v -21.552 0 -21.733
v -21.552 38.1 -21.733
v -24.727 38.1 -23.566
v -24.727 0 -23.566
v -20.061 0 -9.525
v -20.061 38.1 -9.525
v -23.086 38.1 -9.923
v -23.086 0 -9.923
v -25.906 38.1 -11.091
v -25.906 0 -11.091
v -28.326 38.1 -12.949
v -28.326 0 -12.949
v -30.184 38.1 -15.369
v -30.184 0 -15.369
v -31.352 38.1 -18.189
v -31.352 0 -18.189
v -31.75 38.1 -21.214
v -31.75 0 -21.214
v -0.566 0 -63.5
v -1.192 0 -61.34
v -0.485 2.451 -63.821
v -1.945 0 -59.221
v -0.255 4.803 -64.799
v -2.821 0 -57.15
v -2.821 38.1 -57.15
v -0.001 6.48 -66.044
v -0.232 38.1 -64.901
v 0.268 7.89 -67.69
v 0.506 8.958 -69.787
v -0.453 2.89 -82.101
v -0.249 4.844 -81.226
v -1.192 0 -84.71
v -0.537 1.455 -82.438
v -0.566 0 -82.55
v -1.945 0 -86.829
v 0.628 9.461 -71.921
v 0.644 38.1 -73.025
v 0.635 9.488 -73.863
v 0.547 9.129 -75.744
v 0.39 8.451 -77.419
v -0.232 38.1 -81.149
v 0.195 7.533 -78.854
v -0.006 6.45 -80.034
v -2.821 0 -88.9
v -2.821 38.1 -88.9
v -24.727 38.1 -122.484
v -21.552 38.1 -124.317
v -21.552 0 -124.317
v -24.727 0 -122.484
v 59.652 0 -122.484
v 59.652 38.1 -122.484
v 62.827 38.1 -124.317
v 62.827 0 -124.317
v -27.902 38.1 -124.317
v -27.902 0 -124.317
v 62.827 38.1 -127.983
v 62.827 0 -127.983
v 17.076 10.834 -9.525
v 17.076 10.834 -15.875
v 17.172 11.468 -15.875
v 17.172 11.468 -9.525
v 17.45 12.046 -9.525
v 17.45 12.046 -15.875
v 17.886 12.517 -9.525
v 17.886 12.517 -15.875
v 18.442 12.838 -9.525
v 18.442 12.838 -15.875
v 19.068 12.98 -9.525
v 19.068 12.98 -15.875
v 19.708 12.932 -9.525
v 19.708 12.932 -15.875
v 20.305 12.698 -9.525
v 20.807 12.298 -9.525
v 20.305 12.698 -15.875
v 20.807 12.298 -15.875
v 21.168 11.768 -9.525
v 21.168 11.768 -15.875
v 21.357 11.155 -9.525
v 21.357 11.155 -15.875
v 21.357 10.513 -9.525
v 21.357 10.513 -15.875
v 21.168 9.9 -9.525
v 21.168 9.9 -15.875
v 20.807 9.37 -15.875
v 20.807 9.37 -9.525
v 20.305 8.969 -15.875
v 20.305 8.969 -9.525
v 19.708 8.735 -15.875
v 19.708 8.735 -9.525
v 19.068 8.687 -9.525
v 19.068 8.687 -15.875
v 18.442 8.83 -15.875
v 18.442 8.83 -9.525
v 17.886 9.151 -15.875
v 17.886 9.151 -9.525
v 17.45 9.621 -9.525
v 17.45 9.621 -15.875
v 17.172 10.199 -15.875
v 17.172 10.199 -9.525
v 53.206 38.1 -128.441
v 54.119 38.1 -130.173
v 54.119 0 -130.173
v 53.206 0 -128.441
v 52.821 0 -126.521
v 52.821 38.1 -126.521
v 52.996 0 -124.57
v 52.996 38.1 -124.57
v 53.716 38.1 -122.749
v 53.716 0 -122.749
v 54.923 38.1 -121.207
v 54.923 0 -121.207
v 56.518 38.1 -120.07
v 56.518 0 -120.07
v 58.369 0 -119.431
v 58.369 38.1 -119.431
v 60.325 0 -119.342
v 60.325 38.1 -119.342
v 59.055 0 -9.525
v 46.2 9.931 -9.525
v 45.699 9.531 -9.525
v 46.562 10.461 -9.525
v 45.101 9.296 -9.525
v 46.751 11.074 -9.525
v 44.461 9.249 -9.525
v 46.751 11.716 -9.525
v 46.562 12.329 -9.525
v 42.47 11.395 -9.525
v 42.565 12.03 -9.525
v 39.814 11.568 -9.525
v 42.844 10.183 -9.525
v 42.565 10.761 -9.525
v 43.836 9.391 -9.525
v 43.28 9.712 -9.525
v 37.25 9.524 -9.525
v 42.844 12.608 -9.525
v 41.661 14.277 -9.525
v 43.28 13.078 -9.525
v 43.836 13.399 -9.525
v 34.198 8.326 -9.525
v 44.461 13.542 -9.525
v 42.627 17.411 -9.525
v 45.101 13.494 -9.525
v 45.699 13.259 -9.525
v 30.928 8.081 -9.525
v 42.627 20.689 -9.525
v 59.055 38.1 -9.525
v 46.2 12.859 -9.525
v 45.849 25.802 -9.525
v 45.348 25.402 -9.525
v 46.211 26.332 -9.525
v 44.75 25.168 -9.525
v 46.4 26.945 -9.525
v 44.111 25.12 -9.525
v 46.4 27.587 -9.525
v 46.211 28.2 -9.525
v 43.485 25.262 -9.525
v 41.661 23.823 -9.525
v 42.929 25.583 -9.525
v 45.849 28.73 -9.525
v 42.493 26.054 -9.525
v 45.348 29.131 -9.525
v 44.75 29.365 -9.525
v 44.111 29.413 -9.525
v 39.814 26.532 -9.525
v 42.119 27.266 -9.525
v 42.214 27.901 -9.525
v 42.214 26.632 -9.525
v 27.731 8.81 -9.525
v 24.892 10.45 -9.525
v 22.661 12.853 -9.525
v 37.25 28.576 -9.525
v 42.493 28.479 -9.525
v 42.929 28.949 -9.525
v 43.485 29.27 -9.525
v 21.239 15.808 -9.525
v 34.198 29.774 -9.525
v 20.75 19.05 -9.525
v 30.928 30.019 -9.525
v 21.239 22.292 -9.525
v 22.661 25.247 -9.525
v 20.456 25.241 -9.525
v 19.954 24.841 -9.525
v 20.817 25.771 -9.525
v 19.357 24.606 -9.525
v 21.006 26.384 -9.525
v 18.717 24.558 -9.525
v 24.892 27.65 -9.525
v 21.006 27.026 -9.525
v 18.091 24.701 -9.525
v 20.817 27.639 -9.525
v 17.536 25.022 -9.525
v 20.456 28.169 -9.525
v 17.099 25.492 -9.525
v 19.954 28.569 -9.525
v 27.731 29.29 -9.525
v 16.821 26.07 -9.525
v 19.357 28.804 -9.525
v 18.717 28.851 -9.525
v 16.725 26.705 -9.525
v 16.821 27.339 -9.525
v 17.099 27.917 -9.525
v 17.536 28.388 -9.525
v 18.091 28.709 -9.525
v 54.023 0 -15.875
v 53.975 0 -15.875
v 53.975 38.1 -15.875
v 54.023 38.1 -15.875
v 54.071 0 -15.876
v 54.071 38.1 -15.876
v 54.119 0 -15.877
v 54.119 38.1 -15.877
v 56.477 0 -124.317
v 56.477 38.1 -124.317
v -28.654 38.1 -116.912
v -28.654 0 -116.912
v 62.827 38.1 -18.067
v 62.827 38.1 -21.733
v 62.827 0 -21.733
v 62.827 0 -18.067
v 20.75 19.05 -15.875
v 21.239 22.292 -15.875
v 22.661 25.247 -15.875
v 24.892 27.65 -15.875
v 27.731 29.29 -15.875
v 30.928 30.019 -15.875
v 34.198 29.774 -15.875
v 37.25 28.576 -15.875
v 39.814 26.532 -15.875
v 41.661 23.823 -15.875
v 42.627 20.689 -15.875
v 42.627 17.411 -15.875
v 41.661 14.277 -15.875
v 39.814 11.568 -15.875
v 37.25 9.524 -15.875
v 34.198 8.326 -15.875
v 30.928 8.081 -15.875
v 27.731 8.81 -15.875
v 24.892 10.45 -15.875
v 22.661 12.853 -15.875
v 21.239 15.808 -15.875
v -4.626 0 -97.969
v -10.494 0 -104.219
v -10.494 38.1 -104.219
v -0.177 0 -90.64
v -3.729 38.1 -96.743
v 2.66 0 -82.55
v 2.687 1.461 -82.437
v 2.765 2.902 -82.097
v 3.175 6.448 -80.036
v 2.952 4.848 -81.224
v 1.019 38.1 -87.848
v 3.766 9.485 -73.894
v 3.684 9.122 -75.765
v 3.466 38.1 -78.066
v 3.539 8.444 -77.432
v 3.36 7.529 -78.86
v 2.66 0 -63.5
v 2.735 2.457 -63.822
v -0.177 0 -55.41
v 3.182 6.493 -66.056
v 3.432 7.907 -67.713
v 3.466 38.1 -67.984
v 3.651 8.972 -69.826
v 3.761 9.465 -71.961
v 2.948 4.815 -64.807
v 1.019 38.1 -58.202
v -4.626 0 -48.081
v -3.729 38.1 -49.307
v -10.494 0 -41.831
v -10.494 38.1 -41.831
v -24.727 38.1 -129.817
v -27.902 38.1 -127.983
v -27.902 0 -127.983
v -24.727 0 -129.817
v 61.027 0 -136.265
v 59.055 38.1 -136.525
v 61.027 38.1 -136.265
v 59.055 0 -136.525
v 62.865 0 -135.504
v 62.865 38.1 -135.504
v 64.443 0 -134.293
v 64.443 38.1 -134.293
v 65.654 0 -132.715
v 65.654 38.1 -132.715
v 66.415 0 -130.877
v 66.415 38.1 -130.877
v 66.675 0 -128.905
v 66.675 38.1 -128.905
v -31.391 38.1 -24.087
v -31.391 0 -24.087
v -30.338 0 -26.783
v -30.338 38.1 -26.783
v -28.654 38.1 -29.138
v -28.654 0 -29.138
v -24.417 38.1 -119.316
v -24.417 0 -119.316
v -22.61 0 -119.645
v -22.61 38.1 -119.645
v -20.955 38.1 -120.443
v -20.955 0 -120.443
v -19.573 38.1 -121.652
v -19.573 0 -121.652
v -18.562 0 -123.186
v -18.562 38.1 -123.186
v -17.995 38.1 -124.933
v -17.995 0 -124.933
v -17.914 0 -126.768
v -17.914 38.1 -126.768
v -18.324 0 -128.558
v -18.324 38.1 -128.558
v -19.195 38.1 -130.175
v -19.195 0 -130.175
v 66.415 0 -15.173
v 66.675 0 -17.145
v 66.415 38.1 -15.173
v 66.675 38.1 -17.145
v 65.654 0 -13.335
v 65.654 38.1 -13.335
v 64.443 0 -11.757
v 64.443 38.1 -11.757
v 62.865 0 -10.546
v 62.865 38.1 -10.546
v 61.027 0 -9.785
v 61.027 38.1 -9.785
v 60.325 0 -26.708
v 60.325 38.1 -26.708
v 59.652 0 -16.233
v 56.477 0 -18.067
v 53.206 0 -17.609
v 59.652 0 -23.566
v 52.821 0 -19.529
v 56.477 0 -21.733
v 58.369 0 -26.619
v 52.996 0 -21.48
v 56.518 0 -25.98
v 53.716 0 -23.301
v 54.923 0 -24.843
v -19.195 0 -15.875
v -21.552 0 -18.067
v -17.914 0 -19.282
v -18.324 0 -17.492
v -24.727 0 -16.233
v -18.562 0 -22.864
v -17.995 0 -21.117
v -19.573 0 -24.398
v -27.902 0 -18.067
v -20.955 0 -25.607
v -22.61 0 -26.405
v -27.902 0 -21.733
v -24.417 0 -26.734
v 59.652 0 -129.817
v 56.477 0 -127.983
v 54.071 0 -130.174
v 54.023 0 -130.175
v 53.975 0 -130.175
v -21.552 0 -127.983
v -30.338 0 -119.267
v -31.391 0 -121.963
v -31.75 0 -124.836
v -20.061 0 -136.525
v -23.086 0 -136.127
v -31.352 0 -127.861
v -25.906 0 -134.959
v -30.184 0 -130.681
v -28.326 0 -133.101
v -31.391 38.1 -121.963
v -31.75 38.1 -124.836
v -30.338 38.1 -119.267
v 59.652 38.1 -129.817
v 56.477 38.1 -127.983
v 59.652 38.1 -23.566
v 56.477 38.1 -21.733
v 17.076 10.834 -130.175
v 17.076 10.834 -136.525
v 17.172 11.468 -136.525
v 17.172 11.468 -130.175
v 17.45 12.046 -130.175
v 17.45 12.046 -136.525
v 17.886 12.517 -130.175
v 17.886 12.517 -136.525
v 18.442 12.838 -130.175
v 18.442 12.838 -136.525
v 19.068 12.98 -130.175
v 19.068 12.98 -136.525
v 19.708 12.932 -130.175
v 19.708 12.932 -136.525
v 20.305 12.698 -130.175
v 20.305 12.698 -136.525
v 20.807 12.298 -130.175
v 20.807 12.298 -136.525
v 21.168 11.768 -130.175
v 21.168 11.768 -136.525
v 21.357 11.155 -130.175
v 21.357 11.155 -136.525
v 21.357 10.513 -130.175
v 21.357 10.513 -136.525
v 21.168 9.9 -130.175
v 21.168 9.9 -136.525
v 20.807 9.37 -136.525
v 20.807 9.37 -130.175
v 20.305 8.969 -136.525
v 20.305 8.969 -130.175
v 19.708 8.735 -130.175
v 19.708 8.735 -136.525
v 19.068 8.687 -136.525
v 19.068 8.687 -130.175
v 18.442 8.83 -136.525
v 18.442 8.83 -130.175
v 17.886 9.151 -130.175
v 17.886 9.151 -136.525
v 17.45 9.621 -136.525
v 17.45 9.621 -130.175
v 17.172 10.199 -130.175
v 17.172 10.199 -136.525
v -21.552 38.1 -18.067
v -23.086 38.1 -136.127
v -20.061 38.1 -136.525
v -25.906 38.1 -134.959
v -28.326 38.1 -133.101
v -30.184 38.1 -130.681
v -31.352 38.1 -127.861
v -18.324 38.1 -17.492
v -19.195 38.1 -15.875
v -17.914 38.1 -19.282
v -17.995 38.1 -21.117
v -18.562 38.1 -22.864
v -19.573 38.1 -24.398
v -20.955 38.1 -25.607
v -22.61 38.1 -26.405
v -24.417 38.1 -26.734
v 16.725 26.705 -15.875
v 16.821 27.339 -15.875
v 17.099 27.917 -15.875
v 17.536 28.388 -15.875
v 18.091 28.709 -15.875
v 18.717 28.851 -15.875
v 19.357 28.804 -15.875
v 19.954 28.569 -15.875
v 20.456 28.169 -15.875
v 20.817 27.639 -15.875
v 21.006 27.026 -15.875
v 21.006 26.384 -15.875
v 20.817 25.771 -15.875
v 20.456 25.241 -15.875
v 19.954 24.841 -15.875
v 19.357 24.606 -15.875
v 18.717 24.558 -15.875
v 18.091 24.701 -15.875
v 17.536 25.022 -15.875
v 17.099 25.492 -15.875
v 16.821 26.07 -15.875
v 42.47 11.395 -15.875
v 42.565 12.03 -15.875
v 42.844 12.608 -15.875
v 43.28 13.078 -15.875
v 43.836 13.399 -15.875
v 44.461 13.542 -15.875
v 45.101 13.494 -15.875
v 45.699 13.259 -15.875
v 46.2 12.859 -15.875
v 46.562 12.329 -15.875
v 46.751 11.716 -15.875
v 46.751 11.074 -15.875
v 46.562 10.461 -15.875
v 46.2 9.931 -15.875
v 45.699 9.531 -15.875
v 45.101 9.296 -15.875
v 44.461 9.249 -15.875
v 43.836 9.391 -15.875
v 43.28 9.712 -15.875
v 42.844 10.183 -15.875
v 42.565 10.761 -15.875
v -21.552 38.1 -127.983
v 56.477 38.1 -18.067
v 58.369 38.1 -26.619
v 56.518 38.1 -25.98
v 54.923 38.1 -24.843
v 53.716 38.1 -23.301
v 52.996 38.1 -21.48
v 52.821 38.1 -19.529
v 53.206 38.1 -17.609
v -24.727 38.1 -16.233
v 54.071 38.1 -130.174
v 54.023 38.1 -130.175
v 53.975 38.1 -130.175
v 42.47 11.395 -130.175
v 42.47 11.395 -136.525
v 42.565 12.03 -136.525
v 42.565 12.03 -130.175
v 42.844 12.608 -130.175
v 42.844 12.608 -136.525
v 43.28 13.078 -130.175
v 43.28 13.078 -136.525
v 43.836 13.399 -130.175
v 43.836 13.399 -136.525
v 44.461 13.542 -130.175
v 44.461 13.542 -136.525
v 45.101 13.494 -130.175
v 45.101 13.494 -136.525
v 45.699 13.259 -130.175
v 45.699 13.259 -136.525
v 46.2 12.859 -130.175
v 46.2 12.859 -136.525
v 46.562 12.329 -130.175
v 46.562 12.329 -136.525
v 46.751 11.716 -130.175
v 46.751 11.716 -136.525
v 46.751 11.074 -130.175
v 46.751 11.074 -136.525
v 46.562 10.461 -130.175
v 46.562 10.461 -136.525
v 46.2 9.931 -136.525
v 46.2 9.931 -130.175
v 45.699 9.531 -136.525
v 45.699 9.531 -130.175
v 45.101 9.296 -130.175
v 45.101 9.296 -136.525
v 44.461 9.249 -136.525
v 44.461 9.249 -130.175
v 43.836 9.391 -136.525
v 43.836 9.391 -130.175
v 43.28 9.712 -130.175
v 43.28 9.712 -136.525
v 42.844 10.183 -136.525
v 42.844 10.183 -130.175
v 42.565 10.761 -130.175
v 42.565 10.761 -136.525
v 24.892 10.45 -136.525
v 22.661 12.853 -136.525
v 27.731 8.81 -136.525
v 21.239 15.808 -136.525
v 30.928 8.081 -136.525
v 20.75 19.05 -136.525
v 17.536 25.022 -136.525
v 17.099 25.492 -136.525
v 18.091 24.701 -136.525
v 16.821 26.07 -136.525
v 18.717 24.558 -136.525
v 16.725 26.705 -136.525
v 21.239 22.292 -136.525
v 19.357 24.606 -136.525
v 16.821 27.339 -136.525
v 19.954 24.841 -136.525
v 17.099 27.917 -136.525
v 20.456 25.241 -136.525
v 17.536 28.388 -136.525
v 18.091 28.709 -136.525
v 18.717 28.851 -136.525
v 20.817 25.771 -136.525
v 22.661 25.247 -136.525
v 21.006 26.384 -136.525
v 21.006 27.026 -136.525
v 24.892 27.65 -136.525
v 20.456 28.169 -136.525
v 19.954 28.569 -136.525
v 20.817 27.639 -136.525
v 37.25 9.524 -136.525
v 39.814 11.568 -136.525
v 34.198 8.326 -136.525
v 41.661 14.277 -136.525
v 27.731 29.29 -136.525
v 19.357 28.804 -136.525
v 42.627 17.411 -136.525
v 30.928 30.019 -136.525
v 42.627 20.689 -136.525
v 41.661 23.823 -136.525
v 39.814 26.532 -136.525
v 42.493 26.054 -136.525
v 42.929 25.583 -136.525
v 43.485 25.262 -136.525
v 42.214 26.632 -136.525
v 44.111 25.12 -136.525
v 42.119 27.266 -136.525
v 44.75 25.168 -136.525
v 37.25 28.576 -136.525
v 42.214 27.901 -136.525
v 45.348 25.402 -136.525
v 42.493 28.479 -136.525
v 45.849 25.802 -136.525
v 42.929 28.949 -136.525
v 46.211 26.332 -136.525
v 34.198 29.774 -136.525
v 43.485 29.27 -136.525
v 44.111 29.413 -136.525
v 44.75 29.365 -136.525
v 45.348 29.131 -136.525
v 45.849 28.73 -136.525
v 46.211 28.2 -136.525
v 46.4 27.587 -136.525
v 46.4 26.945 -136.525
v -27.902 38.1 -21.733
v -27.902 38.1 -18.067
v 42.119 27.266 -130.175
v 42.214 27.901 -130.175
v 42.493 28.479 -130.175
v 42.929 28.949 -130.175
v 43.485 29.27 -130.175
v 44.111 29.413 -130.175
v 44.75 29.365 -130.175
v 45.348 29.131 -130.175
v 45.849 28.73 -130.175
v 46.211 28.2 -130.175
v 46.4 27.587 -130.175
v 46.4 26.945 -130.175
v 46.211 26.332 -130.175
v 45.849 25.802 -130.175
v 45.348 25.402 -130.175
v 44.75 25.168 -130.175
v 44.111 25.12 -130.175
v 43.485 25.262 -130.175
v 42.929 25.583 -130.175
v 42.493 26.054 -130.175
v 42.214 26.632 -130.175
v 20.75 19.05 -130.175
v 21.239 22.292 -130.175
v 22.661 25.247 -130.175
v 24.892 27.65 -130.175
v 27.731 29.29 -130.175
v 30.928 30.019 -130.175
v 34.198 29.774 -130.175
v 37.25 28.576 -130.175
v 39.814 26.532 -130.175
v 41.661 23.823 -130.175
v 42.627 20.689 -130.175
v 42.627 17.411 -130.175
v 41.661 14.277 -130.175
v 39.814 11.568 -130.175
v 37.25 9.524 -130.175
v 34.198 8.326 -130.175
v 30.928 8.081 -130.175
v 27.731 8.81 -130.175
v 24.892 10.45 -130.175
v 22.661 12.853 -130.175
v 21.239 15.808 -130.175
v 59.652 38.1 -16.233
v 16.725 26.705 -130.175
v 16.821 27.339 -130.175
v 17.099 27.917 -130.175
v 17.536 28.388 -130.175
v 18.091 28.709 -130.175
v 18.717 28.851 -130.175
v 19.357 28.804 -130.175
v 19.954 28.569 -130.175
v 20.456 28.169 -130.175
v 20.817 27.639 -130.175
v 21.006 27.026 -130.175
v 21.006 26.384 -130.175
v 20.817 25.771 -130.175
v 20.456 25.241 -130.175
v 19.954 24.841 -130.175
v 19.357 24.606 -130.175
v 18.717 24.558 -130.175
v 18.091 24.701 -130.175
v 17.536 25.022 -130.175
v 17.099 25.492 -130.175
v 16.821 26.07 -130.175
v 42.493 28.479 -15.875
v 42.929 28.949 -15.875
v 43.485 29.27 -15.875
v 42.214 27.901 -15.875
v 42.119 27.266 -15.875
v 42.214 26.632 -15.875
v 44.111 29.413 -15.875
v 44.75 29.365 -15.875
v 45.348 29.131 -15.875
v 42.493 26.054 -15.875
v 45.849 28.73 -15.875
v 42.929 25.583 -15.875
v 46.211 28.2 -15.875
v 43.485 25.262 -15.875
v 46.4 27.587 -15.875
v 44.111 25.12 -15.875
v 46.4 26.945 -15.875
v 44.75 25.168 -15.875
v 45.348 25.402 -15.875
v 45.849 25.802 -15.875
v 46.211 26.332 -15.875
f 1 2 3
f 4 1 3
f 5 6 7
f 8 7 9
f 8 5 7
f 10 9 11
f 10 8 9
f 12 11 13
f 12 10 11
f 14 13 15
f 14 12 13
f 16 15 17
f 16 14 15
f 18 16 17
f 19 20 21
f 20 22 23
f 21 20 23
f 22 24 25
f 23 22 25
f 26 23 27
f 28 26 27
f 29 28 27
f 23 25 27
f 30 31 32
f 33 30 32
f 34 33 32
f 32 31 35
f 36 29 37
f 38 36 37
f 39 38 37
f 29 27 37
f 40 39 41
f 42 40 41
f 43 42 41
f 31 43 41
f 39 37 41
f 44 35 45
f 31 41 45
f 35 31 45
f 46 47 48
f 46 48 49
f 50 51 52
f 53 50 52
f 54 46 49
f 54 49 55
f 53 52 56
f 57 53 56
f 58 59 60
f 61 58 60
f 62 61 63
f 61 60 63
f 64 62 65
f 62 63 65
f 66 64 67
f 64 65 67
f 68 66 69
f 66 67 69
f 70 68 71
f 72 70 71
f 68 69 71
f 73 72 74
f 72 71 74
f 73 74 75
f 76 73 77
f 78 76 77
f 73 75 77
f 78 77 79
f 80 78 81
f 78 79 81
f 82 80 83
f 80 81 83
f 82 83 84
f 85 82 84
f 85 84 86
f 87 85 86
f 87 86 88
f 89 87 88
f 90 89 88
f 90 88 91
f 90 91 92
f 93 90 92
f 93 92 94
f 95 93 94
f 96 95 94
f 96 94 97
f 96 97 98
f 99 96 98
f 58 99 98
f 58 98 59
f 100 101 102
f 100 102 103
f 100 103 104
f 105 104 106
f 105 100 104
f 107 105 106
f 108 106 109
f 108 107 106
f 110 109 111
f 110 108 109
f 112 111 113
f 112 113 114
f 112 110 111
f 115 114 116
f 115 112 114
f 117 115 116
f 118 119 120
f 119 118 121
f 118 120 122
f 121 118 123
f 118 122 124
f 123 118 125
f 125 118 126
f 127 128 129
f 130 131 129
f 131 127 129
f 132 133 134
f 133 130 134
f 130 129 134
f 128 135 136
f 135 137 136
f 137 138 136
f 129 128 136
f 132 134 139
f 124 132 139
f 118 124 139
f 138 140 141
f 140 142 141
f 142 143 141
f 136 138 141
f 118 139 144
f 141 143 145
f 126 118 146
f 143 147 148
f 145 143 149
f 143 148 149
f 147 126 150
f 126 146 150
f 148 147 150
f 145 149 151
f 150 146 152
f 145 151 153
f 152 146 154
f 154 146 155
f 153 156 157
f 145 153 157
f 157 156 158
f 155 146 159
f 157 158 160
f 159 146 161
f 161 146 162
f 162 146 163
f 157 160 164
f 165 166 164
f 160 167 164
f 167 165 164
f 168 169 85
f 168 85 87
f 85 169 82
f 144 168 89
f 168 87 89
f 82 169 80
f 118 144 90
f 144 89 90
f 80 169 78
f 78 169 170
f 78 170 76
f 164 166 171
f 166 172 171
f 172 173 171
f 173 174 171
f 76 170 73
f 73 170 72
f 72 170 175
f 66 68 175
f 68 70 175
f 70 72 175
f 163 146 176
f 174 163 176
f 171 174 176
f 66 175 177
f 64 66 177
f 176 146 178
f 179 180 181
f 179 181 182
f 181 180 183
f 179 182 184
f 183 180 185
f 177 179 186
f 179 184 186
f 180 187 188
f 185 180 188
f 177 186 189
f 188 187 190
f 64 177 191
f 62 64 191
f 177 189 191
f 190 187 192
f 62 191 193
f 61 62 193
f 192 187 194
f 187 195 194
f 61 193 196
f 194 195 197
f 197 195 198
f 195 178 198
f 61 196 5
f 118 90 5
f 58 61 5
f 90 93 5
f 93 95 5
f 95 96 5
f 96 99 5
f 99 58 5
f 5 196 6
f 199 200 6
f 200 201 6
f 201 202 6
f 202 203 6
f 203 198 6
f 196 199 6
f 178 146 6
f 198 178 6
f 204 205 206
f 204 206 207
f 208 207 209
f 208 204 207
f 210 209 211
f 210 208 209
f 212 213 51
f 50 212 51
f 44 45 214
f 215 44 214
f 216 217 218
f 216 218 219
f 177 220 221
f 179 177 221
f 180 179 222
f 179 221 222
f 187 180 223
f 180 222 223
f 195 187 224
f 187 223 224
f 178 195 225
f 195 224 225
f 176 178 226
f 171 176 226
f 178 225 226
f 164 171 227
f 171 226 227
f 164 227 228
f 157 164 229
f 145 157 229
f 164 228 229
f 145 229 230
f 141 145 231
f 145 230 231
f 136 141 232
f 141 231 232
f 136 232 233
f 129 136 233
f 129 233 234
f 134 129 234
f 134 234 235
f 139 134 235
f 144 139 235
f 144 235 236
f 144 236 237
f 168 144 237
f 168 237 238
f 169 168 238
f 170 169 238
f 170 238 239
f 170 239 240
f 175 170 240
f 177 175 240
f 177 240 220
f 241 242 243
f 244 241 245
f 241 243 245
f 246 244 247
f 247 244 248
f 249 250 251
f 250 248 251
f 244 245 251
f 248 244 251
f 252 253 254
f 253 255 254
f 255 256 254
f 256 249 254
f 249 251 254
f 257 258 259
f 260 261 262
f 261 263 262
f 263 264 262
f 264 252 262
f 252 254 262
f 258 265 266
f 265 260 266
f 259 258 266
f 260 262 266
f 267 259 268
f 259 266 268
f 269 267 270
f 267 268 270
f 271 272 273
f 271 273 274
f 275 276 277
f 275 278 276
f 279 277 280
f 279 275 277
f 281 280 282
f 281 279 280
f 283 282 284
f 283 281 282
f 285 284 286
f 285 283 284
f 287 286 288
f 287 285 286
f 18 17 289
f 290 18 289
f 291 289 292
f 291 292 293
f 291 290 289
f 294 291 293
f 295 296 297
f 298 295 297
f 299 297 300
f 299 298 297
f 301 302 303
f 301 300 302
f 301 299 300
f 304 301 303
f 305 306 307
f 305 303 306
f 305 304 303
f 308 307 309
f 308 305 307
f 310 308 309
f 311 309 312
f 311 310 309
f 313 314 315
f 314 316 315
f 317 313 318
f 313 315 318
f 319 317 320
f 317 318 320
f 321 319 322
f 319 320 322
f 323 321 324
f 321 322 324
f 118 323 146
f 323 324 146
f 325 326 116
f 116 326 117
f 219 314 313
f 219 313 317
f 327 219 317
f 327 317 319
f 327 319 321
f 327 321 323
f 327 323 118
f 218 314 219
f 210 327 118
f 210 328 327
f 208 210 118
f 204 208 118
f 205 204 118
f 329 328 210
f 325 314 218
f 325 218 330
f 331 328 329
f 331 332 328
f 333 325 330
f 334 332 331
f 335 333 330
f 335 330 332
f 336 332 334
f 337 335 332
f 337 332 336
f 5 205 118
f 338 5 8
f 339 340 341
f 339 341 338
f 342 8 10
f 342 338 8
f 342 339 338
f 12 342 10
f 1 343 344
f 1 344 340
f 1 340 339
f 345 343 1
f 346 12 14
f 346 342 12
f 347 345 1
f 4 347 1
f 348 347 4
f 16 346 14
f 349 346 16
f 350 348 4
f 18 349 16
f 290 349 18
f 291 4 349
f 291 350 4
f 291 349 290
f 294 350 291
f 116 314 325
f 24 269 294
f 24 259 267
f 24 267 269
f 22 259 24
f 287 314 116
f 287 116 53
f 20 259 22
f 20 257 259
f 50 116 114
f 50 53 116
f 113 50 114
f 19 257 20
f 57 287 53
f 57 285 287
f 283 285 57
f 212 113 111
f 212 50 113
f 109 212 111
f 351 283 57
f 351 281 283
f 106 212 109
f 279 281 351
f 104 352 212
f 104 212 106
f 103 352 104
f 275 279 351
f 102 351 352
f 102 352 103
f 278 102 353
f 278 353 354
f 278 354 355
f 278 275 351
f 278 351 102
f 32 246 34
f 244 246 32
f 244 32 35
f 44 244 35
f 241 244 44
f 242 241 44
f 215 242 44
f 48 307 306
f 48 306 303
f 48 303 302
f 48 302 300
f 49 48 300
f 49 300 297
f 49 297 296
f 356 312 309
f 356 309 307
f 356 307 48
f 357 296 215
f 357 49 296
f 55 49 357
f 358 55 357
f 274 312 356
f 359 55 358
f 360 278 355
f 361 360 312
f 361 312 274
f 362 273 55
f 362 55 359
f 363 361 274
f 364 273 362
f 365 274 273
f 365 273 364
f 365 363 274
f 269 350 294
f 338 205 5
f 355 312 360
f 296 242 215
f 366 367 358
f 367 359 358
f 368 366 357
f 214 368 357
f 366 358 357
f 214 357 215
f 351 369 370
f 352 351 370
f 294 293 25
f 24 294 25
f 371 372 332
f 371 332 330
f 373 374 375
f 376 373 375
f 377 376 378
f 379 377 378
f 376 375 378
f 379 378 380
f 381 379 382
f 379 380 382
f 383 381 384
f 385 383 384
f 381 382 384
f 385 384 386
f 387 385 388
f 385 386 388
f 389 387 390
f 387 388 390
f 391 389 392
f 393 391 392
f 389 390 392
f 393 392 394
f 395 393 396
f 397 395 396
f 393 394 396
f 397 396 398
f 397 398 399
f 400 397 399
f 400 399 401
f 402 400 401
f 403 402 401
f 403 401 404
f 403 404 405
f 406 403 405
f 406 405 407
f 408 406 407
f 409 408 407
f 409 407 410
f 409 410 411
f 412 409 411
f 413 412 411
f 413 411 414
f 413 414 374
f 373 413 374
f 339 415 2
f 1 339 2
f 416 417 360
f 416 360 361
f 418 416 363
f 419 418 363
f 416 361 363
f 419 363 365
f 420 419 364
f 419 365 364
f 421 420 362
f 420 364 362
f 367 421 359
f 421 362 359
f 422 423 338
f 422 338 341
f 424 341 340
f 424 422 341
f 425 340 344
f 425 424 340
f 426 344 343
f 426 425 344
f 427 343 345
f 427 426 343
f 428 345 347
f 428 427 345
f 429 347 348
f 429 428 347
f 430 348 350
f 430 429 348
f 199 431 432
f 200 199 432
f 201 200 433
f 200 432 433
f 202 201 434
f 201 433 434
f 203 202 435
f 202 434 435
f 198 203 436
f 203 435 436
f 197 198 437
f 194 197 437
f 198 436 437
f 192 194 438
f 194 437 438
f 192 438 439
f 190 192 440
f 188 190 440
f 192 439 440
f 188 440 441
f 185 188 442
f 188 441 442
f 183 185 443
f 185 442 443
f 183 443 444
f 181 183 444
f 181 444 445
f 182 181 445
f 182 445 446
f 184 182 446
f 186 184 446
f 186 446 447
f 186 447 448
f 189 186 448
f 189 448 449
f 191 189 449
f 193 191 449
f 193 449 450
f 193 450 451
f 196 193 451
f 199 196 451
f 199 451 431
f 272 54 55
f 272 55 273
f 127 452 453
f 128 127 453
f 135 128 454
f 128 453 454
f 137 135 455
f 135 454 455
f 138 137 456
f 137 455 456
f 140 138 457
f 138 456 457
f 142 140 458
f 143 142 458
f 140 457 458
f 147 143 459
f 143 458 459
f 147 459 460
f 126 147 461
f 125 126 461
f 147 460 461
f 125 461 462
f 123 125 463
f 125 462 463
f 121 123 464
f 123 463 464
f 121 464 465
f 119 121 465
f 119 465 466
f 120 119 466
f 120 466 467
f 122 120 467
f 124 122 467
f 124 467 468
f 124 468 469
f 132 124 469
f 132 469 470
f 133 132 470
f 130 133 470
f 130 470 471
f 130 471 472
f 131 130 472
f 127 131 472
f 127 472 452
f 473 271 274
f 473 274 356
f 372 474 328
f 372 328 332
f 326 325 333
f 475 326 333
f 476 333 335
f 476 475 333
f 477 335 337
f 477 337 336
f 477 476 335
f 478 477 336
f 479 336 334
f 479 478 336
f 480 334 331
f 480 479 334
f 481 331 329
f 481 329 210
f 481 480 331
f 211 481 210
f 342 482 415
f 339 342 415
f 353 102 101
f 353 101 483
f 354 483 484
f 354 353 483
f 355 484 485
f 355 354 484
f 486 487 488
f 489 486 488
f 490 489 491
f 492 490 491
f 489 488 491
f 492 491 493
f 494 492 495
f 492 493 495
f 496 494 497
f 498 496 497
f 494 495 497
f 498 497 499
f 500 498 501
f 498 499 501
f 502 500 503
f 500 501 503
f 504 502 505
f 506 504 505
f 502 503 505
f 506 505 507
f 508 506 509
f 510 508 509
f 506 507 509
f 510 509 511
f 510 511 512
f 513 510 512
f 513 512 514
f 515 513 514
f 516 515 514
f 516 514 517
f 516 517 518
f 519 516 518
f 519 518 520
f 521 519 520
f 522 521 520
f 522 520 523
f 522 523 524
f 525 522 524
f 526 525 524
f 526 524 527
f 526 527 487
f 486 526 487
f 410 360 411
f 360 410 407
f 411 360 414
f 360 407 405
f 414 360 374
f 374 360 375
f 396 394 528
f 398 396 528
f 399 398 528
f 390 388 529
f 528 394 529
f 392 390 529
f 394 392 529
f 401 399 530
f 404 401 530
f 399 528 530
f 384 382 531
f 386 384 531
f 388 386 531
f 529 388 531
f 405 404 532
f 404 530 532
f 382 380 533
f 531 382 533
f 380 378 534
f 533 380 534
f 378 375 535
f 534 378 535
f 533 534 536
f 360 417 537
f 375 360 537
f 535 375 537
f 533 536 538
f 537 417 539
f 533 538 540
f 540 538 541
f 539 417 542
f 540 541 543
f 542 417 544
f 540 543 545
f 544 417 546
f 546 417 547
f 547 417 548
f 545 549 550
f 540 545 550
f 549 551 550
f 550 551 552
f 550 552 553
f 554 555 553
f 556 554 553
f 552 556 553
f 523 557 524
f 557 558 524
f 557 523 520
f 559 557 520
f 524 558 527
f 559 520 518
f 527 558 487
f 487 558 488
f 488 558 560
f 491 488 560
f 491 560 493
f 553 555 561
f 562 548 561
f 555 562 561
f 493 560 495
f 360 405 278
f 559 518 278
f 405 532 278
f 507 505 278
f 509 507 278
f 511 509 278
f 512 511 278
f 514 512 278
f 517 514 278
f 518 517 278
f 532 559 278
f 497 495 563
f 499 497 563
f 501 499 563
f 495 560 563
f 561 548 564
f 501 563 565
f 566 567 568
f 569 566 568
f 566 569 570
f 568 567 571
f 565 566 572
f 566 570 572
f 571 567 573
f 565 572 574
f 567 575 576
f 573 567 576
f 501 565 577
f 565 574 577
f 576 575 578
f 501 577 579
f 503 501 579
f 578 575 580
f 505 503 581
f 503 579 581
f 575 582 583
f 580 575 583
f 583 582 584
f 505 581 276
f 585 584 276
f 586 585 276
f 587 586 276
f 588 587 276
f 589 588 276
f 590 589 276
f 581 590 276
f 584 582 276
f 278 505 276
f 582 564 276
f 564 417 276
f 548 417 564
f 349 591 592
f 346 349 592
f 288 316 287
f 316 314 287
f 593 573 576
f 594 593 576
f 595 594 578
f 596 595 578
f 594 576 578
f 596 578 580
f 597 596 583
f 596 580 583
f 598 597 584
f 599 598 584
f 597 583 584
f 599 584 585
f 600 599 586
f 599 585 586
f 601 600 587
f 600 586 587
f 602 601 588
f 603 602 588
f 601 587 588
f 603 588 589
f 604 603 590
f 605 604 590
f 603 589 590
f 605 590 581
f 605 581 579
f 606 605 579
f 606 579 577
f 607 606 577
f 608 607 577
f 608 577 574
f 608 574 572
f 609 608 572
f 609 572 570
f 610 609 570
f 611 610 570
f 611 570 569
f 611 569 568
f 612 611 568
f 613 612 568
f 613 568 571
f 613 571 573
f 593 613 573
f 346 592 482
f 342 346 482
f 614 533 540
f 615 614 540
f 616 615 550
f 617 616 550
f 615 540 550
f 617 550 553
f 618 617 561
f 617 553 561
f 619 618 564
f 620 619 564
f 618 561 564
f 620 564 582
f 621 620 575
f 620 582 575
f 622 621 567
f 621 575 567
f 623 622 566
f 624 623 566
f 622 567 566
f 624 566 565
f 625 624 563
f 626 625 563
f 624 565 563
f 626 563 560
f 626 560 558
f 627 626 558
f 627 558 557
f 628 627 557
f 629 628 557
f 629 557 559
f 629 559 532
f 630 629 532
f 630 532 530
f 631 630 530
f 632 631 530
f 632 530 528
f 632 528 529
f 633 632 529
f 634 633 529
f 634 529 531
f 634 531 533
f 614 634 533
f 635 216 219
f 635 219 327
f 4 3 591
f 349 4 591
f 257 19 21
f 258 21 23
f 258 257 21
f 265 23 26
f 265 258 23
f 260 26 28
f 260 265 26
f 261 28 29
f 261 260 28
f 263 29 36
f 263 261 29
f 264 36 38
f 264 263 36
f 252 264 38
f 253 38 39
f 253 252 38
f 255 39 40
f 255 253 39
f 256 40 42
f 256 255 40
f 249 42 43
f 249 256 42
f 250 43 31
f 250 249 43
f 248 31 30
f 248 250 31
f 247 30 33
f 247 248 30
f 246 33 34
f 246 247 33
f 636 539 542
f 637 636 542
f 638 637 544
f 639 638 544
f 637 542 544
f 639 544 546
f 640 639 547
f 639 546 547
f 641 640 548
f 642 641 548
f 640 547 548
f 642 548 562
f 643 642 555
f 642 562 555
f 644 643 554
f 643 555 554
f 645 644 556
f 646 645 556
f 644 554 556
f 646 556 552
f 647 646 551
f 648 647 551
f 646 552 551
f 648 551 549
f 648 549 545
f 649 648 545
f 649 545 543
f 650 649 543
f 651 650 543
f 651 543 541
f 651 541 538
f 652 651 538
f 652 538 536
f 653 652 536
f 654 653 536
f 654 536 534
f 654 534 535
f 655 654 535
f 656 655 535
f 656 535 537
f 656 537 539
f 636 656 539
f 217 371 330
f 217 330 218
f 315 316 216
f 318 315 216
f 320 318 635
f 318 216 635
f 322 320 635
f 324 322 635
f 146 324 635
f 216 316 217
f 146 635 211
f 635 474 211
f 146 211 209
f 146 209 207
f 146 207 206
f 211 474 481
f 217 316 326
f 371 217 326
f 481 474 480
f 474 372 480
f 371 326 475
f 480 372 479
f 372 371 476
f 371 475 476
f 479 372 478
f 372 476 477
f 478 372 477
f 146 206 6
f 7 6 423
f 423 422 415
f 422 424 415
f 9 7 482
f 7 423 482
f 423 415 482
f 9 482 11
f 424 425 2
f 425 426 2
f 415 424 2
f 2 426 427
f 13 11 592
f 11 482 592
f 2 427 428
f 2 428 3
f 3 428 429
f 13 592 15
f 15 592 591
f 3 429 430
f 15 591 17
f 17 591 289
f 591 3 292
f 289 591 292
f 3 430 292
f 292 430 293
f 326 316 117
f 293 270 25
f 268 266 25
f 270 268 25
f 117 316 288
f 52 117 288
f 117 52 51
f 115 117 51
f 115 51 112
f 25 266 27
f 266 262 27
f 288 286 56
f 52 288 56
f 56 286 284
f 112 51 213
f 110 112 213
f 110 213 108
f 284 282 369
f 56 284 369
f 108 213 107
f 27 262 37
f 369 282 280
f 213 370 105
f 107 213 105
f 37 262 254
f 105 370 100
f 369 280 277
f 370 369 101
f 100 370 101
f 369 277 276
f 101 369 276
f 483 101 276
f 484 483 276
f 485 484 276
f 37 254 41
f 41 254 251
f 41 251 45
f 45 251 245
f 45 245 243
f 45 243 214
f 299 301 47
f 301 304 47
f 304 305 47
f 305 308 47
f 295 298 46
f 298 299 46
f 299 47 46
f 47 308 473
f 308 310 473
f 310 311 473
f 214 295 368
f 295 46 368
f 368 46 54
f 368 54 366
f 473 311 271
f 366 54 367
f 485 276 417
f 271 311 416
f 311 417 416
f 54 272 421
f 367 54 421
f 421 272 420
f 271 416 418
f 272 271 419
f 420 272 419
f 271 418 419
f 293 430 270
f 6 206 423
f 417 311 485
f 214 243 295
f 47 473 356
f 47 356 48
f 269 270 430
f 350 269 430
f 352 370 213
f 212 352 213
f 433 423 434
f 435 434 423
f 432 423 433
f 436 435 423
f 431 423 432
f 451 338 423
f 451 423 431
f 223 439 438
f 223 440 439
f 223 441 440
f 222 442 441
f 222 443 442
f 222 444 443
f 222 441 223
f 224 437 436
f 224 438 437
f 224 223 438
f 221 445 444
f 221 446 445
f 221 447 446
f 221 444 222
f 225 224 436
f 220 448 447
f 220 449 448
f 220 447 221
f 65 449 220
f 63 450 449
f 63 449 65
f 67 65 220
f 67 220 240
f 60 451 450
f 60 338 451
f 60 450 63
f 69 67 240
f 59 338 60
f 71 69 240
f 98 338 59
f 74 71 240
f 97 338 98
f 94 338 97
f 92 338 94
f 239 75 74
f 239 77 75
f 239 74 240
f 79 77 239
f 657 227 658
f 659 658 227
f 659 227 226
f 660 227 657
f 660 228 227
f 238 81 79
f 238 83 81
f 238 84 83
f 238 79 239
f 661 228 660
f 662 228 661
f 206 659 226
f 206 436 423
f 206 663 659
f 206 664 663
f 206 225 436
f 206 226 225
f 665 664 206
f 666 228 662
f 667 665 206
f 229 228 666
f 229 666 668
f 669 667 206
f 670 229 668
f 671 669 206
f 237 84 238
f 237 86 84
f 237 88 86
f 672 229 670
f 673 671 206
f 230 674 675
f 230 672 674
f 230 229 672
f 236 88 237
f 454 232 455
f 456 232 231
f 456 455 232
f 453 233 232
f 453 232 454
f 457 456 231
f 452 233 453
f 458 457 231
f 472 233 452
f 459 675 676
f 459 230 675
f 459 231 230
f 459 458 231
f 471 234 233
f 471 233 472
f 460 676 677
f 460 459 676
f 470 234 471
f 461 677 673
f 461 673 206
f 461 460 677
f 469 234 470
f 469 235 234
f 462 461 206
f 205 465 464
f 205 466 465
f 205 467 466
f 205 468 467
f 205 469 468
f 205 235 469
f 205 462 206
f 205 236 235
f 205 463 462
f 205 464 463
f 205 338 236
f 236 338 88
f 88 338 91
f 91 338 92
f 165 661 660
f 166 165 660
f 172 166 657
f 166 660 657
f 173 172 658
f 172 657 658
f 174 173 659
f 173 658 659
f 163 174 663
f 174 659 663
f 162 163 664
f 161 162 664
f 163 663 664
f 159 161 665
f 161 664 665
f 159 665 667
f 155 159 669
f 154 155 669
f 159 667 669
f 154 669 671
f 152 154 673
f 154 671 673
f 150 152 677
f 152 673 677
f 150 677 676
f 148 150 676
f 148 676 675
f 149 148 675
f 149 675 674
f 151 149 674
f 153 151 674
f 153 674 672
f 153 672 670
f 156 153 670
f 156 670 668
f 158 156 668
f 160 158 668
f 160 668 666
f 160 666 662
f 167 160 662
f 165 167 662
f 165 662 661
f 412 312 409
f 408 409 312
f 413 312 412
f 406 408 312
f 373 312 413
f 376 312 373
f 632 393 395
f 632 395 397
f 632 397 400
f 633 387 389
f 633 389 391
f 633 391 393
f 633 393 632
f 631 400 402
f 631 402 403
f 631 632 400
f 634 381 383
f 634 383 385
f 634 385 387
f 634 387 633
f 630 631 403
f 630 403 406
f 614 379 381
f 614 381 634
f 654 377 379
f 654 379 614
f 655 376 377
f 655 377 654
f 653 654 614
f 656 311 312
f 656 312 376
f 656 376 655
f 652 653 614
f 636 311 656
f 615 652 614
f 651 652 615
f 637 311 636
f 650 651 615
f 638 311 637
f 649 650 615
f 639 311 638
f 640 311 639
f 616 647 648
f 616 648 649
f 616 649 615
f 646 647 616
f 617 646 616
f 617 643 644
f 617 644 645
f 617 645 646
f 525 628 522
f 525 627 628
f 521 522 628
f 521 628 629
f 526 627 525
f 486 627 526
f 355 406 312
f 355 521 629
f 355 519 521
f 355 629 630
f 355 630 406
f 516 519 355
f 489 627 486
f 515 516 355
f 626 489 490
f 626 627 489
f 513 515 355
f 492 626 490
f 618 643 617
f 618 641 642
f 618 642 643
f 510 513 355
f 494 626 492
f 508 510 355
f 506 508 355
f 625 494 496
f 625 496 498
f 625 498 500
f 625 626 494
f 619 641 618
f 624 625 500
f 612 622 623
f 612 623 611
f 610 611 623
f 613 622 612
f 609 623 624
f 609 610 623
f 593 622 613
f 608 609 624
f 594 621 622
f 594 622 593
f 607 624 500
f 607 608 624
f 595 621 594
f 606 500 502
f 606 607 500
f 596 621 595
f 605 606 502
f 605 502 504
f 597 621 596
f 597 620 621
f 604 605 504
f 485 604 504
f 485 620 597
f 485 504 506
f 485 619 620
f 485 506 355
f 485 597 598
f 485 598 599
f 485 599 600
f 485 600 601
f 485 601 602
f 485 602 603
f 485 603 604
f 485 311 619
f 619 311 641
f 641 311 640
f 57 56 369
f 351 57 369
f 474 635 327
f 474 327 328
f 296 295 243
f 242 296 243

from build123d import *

# Parameters (mm, degrees)
SKETCH1_W               = 95.25
SKETCH1_H               = 6.35
BOSS_EXTRUDE1_DEPTH     = 38.1
SKETCH2_W               = 6.35
SKETCH2_H               = 127
BOSS_EXTRUDE2_DEPTH     = 38.1
SKETCH3_W               = 88.9
SKETCH3_H               = 6.35
BOSS_EXTRUDE3_DEPTH     = 38.1
SKETCH4_R               = 11
CUT_EXTRUDE1_DEPTH      = 149.412147835
SKETCH5_R               = 2.15265
CUT_EXTRUDE2_DEPTH      = 149.412147835
FILLET1_R               = 7.62
BOSS_EXTRUDE4_DEPTH     = 38.1
CUT_EXTRUDE8_REACH      = 171.022
CUT_EXTRUDE8_END_RADIUS = 38.1
FILLET2_R               = 11.688947
FILLET3_R               = 11.688947
FILLET4_R               = 6.35
SKETCH15_R              = 6.841174209
BOSS_EXTRUDE7_DEPTH     = 38.1
CUT_EXTRUDE12_DEPTH     = 157.640484095


with BuildPart() as part:
    # Sketch1 → Boss-Extrude1 (new body)
    with BuildSketch(Plane(origin=(0, 0, 0), x_dir=(1, 0, 0), z_dir=(0, 1, 0))):
        with Locations((19.05, 12.7)):
            Rectangle(SKETCH1_W, SKETCH1_H)
    extrude(amount=BOSS_EXTRUDE1_DEPTH)

    # Sketch2 → Boss-Extrude2 (add)
    with BuildSketch(Plane(origin=(0, 38.1, 0), x_dir=(1, 0, 0), z_dir=(0, 1, 0))):
        with Locations((63.5, 73.025)):
            Rectangle(SKETCH2_W, SKETCH2_H)
    extrude(amount=-BOSS_EXTRUDE2_DEPTH)

    # Sketch3 → Boss-Extrude3 (add)
    with BuildSketch(Plane(origin=(0, 38.1, 0), x_dir=(1, 0, 0), z_dir=(0, 1, 0))):
        with Locations((15.875, 133.35)):
            Rectangle(SKETCH3_W, SKETCH3_H)
    extrude(amount=-BOSS_EXTRUDE3_DEPTH)

    # Sketch4 → Cut-Extrude1 (cut, through all)
    with BuildSketch(Plane(origin=(0, 0, -136.525), x_dir=(-1, 0, 0), z_dir=(0, 0, -1))):
        with Locations((-31.75, 19.05)):
            Circle(SKETCH4_R)
    extrude(amount=-CUT_EXTRUDE1_DEPTH, mode=Mode.SUBTRACT)

    # Sketch5 → Cut-Extrude2 (cut, through all)
    with BuildSketch(Plane(origin=(0, 0, -136.525), x_dir=(-1, 0, 0), z_dir=(0, 0, -1))):
        with Locations((-18.877667779, 26.704865736)):
            Circle(SKETCH5_R)
        with Locations((-19.228536904, 10.833743663)):
            Circle(SKETCH5_R)
        with Locations((-44.622332221, 11.395134264)):
            Circle(SKETCH5_R)
        with Locations((-44.271463096, 27.266256337)):
            Circle(SKETCH5_R)
    extrude(amount=-CUT_EXTRUDE2_DEPTH, mode=Mode.SUBTRACT)

    # Fillet1
    fillet1_edges = [part.edges().sort_by_distance(p)[0] for p in [
        (66.675, 19.05, -136.525),
        (66.675, 19.05, -9.525),
    ]]
    fillet(fillet1_edges, radius=FILLET1_R)

    # Sketch10 → Boss-Extrude4 (add)
    with BuildSketch(Plane(origin=(0, 38.1, 0), x_dir=(1, 0, 0), z_dir=(0, 1, 0))):
        with BuildLine():
            Line((-28.575, 15.875), (-28.575, 9.525))
            Line((-28.575, 9.525), (-31.75, 9.525))
            Line((-31.75, 9.525), (-31.75, 25.781))
            Line((-31.75, 25.781), (-2.821027965, 57.15))
            ThreePointArc((-2.821027965, 57.15), (0.643811071, 73.025), (-2.821027965, 88.9))
            Line((-2.821027965, 88.9), (-31.75, 120.269))
            Line((-31.75, 120.269), (-31.75, 136.525))
            Line((-31.75, 136.525), (-28.575, 136.525))
            Line((-28.575, 136.525), (-28.575, 123.825))
            Line((-28.575, 123.825), (-10.494392478, 104.219375))
            ThreePointArc((-10.494392478, 104.219375), (3.775200806, 73.025), (-10.494392478, 41.830625))
            Line((-10.494392478, 41.830625), (-28.575, 22.225))
            Line((-28.575, 22.225), (-28.575, 15.875))
        make_face()
    extrude(amount=-BOSS_EXTRUDE4_DEPTH)

    # Cut-Extrude8: up to this cylinder (the profile starts outside it)
    cut_extrude8_end = Plane(origin=(-37.456188929, 4.042536, -73.025), z_dir=(0, 1, 0)) * Cylinder(CUT_EXTRUDE8_END_RADIUS, 419.244, mode=Mode.PRIVATE)
    # Sketch12 → Cut-Extrude8 (cut, up to the surface)
    with BuildSketch(Plane.ZY.offset(-60.325), mode=Mode.PRIVATE) as cut_extrude8_sk1:
        with BuildLine():
            Line((-82.55, 0), (-63.5, 0))
            ThreePointArc((-63.5, 0), (-73.025, 9.525), (-82.55, 0))
        make_face()
    cut_extrude8_tool1 = extrude(cut_extrude8_sk1.sketch, amount=CUT_EXTRUDE8_REACH, mode=Mode.PRIVATE) - cut_extrude8_end
    add(cut_extrude8_tool1.solids().sort_by_distance((60.325, 4.042536, -73.025))[0], mode=Mode.SUBTRACT)

    # Fillet2
    fillet2_edges = [part.edges().sort_by_distance(p)[0] for p in [
        (-31.75, 19.05, -136.525),
        (-31.75, 19.05, -120.269),
    ]]
    fillet(fillet2_edges, radius=FILLET2_R - 0.0001)  # a hair under: the kernel refuses the full size

    # Fillet3
    fillet3_edges = [part.edges().sort_by_distance(p)[0] for p in [
        (-31.75, 19.05, -25.781),
        (-31.75, 19.05, -9.525),
    ]]
    fillet(fillet3_edges, radius=FILLET3_R - 0.0001)  # a hair under: the kernel refuses the full size

    # Fillet4
    fillet4_edges = [part.edges().sort_by_distance(p)[0] for p in [
        (60.325, 19.05, -15.875),
        (60.325, 19.05, -130.175),
    ]]
    fillet(fillet4_edges, radius=FILLET4_R)

    # Sketch15 → Boss-Extrude7 (add)
    # profile 1 of 4: a face of its own
    with BuildSketch(Plane(origin=(0, 38.1, 0), x_dir=(1, 0, 0), z_dir=(0, 1, 0))):
        with Locations((59.652254611, 126.150383493)):
            Circle(SKETCH15_R)
        Polygon((59.652254611, 129.816557703), (56.477254611, 127.983470598), (56.477254611, 124.317296388), (59.652254611, 122.484209284), (62.827254611, 124.317296388), (62.827254611, 127.983470598), align=None, mode=Mode.SUBTRACT)
    # profile 2 of 4: a face of its own
    with BuildSketch(Plane(origin=(0, 38.1, 0), x_dir=(1, 0, 0), z_dir=(0, 1, 0))):
        with Locations((-24.727254611, 19.899616507)):
            Circle(SKETCH15_R)
        Polygon((-21.552254611, 21.732703612), (-24.727254611, 23.565790716), (-27.902254611, 21.732703612), (-27.902254611, 18.066529402), (-24.727254611, 16.233442297), (-21.552254611, 18.066529402), align=None, mode=Mode.SUBTRACT)
    # profile 3 of 4: a face of its own
    with BuildSketch(Plane(origin=(0, 38.1, 0), x_dir=(1, 0, 0), z_dir=(0, 1, 0))):
        with Locations((-24.727254611, 126.150383493)):
            Circle(SKETCH15_R)
        Polygon((-21.552254611, 127.983470598), (-21.552254611, 124.317296388), (-24.727254611, 122.484209284), (-27.902254611, 124.317296388), (-27.902254611, 127.983470598), (-24.727254611, 129.816557703), align=None, mode=Mode.SUBTRACT)
    # profile 4 of 4: a face of its own
    with BuildSketch(Plane(origin=(0, 38.1, 0), x_dir=(1, 0, 0), z_dir=(0, 1, 0))):
        with Locations((59.652254611, 19.899616507)):
            Circle(SKETCH15_R)
        Polygon((56.477254611, 18.066529402), (56.477254611, 21.732703612), (59.652254611, 23.565790716), (62.827254611, 21.732703612), (62.827254611, 18.066529402), (59.652254611, 16.233442297), align=None, mode=Mode.SUBTRACT)
    extrude(amount=-BOSS_EXTRUDE7_DEPTH)

    # Sketch21 → Cut-Extrude12 (cut, through all)
    with BuildSketch(Plane(origin=(0, 38.1, 0), x_dir=(1, 0, 0), z_dir=(0, 1, 0))):
        Polygon((-21.552254611, 21.732703612), (-24.727254611, 23.565790716), (-27.902254611, 21.732703612), (-27.902254611, 18.066529402), (-24.727254611, 16.233442297), (-21.552254611, 18.066529402), align=None)
        Polygon((56.477254611, 18.066529402), (56.477254611, 21.732703612), (59.652254611, 23.565790716), (62.827254611, 21.732703612), (62.827254611, 18.066529402), (59.652254611, 16.233442297), align=None)
        Polygon((59.652254611, 129.816557703), (56.477254611, 127.983470598), (56.477254611, 124.317296388), (59.652254611, 122.484209284), (62.827254611, 124.317296388), (62.827254611, 127.983470598), align=None)
        Polygon((-21.552254611, 127.983470598), (-21.552254611, 124.317296388), (-24.727254611, 122.484209284), (-27.902254611, 124.317296388), (-27.902254611, 127.983470598), (-24.727254611, 129.816557703), align=None)
    extrude(amount=-CUT_EXTRUDE12_DEPTH, mode=Mode.SUBTRACT)


solid = part.part
